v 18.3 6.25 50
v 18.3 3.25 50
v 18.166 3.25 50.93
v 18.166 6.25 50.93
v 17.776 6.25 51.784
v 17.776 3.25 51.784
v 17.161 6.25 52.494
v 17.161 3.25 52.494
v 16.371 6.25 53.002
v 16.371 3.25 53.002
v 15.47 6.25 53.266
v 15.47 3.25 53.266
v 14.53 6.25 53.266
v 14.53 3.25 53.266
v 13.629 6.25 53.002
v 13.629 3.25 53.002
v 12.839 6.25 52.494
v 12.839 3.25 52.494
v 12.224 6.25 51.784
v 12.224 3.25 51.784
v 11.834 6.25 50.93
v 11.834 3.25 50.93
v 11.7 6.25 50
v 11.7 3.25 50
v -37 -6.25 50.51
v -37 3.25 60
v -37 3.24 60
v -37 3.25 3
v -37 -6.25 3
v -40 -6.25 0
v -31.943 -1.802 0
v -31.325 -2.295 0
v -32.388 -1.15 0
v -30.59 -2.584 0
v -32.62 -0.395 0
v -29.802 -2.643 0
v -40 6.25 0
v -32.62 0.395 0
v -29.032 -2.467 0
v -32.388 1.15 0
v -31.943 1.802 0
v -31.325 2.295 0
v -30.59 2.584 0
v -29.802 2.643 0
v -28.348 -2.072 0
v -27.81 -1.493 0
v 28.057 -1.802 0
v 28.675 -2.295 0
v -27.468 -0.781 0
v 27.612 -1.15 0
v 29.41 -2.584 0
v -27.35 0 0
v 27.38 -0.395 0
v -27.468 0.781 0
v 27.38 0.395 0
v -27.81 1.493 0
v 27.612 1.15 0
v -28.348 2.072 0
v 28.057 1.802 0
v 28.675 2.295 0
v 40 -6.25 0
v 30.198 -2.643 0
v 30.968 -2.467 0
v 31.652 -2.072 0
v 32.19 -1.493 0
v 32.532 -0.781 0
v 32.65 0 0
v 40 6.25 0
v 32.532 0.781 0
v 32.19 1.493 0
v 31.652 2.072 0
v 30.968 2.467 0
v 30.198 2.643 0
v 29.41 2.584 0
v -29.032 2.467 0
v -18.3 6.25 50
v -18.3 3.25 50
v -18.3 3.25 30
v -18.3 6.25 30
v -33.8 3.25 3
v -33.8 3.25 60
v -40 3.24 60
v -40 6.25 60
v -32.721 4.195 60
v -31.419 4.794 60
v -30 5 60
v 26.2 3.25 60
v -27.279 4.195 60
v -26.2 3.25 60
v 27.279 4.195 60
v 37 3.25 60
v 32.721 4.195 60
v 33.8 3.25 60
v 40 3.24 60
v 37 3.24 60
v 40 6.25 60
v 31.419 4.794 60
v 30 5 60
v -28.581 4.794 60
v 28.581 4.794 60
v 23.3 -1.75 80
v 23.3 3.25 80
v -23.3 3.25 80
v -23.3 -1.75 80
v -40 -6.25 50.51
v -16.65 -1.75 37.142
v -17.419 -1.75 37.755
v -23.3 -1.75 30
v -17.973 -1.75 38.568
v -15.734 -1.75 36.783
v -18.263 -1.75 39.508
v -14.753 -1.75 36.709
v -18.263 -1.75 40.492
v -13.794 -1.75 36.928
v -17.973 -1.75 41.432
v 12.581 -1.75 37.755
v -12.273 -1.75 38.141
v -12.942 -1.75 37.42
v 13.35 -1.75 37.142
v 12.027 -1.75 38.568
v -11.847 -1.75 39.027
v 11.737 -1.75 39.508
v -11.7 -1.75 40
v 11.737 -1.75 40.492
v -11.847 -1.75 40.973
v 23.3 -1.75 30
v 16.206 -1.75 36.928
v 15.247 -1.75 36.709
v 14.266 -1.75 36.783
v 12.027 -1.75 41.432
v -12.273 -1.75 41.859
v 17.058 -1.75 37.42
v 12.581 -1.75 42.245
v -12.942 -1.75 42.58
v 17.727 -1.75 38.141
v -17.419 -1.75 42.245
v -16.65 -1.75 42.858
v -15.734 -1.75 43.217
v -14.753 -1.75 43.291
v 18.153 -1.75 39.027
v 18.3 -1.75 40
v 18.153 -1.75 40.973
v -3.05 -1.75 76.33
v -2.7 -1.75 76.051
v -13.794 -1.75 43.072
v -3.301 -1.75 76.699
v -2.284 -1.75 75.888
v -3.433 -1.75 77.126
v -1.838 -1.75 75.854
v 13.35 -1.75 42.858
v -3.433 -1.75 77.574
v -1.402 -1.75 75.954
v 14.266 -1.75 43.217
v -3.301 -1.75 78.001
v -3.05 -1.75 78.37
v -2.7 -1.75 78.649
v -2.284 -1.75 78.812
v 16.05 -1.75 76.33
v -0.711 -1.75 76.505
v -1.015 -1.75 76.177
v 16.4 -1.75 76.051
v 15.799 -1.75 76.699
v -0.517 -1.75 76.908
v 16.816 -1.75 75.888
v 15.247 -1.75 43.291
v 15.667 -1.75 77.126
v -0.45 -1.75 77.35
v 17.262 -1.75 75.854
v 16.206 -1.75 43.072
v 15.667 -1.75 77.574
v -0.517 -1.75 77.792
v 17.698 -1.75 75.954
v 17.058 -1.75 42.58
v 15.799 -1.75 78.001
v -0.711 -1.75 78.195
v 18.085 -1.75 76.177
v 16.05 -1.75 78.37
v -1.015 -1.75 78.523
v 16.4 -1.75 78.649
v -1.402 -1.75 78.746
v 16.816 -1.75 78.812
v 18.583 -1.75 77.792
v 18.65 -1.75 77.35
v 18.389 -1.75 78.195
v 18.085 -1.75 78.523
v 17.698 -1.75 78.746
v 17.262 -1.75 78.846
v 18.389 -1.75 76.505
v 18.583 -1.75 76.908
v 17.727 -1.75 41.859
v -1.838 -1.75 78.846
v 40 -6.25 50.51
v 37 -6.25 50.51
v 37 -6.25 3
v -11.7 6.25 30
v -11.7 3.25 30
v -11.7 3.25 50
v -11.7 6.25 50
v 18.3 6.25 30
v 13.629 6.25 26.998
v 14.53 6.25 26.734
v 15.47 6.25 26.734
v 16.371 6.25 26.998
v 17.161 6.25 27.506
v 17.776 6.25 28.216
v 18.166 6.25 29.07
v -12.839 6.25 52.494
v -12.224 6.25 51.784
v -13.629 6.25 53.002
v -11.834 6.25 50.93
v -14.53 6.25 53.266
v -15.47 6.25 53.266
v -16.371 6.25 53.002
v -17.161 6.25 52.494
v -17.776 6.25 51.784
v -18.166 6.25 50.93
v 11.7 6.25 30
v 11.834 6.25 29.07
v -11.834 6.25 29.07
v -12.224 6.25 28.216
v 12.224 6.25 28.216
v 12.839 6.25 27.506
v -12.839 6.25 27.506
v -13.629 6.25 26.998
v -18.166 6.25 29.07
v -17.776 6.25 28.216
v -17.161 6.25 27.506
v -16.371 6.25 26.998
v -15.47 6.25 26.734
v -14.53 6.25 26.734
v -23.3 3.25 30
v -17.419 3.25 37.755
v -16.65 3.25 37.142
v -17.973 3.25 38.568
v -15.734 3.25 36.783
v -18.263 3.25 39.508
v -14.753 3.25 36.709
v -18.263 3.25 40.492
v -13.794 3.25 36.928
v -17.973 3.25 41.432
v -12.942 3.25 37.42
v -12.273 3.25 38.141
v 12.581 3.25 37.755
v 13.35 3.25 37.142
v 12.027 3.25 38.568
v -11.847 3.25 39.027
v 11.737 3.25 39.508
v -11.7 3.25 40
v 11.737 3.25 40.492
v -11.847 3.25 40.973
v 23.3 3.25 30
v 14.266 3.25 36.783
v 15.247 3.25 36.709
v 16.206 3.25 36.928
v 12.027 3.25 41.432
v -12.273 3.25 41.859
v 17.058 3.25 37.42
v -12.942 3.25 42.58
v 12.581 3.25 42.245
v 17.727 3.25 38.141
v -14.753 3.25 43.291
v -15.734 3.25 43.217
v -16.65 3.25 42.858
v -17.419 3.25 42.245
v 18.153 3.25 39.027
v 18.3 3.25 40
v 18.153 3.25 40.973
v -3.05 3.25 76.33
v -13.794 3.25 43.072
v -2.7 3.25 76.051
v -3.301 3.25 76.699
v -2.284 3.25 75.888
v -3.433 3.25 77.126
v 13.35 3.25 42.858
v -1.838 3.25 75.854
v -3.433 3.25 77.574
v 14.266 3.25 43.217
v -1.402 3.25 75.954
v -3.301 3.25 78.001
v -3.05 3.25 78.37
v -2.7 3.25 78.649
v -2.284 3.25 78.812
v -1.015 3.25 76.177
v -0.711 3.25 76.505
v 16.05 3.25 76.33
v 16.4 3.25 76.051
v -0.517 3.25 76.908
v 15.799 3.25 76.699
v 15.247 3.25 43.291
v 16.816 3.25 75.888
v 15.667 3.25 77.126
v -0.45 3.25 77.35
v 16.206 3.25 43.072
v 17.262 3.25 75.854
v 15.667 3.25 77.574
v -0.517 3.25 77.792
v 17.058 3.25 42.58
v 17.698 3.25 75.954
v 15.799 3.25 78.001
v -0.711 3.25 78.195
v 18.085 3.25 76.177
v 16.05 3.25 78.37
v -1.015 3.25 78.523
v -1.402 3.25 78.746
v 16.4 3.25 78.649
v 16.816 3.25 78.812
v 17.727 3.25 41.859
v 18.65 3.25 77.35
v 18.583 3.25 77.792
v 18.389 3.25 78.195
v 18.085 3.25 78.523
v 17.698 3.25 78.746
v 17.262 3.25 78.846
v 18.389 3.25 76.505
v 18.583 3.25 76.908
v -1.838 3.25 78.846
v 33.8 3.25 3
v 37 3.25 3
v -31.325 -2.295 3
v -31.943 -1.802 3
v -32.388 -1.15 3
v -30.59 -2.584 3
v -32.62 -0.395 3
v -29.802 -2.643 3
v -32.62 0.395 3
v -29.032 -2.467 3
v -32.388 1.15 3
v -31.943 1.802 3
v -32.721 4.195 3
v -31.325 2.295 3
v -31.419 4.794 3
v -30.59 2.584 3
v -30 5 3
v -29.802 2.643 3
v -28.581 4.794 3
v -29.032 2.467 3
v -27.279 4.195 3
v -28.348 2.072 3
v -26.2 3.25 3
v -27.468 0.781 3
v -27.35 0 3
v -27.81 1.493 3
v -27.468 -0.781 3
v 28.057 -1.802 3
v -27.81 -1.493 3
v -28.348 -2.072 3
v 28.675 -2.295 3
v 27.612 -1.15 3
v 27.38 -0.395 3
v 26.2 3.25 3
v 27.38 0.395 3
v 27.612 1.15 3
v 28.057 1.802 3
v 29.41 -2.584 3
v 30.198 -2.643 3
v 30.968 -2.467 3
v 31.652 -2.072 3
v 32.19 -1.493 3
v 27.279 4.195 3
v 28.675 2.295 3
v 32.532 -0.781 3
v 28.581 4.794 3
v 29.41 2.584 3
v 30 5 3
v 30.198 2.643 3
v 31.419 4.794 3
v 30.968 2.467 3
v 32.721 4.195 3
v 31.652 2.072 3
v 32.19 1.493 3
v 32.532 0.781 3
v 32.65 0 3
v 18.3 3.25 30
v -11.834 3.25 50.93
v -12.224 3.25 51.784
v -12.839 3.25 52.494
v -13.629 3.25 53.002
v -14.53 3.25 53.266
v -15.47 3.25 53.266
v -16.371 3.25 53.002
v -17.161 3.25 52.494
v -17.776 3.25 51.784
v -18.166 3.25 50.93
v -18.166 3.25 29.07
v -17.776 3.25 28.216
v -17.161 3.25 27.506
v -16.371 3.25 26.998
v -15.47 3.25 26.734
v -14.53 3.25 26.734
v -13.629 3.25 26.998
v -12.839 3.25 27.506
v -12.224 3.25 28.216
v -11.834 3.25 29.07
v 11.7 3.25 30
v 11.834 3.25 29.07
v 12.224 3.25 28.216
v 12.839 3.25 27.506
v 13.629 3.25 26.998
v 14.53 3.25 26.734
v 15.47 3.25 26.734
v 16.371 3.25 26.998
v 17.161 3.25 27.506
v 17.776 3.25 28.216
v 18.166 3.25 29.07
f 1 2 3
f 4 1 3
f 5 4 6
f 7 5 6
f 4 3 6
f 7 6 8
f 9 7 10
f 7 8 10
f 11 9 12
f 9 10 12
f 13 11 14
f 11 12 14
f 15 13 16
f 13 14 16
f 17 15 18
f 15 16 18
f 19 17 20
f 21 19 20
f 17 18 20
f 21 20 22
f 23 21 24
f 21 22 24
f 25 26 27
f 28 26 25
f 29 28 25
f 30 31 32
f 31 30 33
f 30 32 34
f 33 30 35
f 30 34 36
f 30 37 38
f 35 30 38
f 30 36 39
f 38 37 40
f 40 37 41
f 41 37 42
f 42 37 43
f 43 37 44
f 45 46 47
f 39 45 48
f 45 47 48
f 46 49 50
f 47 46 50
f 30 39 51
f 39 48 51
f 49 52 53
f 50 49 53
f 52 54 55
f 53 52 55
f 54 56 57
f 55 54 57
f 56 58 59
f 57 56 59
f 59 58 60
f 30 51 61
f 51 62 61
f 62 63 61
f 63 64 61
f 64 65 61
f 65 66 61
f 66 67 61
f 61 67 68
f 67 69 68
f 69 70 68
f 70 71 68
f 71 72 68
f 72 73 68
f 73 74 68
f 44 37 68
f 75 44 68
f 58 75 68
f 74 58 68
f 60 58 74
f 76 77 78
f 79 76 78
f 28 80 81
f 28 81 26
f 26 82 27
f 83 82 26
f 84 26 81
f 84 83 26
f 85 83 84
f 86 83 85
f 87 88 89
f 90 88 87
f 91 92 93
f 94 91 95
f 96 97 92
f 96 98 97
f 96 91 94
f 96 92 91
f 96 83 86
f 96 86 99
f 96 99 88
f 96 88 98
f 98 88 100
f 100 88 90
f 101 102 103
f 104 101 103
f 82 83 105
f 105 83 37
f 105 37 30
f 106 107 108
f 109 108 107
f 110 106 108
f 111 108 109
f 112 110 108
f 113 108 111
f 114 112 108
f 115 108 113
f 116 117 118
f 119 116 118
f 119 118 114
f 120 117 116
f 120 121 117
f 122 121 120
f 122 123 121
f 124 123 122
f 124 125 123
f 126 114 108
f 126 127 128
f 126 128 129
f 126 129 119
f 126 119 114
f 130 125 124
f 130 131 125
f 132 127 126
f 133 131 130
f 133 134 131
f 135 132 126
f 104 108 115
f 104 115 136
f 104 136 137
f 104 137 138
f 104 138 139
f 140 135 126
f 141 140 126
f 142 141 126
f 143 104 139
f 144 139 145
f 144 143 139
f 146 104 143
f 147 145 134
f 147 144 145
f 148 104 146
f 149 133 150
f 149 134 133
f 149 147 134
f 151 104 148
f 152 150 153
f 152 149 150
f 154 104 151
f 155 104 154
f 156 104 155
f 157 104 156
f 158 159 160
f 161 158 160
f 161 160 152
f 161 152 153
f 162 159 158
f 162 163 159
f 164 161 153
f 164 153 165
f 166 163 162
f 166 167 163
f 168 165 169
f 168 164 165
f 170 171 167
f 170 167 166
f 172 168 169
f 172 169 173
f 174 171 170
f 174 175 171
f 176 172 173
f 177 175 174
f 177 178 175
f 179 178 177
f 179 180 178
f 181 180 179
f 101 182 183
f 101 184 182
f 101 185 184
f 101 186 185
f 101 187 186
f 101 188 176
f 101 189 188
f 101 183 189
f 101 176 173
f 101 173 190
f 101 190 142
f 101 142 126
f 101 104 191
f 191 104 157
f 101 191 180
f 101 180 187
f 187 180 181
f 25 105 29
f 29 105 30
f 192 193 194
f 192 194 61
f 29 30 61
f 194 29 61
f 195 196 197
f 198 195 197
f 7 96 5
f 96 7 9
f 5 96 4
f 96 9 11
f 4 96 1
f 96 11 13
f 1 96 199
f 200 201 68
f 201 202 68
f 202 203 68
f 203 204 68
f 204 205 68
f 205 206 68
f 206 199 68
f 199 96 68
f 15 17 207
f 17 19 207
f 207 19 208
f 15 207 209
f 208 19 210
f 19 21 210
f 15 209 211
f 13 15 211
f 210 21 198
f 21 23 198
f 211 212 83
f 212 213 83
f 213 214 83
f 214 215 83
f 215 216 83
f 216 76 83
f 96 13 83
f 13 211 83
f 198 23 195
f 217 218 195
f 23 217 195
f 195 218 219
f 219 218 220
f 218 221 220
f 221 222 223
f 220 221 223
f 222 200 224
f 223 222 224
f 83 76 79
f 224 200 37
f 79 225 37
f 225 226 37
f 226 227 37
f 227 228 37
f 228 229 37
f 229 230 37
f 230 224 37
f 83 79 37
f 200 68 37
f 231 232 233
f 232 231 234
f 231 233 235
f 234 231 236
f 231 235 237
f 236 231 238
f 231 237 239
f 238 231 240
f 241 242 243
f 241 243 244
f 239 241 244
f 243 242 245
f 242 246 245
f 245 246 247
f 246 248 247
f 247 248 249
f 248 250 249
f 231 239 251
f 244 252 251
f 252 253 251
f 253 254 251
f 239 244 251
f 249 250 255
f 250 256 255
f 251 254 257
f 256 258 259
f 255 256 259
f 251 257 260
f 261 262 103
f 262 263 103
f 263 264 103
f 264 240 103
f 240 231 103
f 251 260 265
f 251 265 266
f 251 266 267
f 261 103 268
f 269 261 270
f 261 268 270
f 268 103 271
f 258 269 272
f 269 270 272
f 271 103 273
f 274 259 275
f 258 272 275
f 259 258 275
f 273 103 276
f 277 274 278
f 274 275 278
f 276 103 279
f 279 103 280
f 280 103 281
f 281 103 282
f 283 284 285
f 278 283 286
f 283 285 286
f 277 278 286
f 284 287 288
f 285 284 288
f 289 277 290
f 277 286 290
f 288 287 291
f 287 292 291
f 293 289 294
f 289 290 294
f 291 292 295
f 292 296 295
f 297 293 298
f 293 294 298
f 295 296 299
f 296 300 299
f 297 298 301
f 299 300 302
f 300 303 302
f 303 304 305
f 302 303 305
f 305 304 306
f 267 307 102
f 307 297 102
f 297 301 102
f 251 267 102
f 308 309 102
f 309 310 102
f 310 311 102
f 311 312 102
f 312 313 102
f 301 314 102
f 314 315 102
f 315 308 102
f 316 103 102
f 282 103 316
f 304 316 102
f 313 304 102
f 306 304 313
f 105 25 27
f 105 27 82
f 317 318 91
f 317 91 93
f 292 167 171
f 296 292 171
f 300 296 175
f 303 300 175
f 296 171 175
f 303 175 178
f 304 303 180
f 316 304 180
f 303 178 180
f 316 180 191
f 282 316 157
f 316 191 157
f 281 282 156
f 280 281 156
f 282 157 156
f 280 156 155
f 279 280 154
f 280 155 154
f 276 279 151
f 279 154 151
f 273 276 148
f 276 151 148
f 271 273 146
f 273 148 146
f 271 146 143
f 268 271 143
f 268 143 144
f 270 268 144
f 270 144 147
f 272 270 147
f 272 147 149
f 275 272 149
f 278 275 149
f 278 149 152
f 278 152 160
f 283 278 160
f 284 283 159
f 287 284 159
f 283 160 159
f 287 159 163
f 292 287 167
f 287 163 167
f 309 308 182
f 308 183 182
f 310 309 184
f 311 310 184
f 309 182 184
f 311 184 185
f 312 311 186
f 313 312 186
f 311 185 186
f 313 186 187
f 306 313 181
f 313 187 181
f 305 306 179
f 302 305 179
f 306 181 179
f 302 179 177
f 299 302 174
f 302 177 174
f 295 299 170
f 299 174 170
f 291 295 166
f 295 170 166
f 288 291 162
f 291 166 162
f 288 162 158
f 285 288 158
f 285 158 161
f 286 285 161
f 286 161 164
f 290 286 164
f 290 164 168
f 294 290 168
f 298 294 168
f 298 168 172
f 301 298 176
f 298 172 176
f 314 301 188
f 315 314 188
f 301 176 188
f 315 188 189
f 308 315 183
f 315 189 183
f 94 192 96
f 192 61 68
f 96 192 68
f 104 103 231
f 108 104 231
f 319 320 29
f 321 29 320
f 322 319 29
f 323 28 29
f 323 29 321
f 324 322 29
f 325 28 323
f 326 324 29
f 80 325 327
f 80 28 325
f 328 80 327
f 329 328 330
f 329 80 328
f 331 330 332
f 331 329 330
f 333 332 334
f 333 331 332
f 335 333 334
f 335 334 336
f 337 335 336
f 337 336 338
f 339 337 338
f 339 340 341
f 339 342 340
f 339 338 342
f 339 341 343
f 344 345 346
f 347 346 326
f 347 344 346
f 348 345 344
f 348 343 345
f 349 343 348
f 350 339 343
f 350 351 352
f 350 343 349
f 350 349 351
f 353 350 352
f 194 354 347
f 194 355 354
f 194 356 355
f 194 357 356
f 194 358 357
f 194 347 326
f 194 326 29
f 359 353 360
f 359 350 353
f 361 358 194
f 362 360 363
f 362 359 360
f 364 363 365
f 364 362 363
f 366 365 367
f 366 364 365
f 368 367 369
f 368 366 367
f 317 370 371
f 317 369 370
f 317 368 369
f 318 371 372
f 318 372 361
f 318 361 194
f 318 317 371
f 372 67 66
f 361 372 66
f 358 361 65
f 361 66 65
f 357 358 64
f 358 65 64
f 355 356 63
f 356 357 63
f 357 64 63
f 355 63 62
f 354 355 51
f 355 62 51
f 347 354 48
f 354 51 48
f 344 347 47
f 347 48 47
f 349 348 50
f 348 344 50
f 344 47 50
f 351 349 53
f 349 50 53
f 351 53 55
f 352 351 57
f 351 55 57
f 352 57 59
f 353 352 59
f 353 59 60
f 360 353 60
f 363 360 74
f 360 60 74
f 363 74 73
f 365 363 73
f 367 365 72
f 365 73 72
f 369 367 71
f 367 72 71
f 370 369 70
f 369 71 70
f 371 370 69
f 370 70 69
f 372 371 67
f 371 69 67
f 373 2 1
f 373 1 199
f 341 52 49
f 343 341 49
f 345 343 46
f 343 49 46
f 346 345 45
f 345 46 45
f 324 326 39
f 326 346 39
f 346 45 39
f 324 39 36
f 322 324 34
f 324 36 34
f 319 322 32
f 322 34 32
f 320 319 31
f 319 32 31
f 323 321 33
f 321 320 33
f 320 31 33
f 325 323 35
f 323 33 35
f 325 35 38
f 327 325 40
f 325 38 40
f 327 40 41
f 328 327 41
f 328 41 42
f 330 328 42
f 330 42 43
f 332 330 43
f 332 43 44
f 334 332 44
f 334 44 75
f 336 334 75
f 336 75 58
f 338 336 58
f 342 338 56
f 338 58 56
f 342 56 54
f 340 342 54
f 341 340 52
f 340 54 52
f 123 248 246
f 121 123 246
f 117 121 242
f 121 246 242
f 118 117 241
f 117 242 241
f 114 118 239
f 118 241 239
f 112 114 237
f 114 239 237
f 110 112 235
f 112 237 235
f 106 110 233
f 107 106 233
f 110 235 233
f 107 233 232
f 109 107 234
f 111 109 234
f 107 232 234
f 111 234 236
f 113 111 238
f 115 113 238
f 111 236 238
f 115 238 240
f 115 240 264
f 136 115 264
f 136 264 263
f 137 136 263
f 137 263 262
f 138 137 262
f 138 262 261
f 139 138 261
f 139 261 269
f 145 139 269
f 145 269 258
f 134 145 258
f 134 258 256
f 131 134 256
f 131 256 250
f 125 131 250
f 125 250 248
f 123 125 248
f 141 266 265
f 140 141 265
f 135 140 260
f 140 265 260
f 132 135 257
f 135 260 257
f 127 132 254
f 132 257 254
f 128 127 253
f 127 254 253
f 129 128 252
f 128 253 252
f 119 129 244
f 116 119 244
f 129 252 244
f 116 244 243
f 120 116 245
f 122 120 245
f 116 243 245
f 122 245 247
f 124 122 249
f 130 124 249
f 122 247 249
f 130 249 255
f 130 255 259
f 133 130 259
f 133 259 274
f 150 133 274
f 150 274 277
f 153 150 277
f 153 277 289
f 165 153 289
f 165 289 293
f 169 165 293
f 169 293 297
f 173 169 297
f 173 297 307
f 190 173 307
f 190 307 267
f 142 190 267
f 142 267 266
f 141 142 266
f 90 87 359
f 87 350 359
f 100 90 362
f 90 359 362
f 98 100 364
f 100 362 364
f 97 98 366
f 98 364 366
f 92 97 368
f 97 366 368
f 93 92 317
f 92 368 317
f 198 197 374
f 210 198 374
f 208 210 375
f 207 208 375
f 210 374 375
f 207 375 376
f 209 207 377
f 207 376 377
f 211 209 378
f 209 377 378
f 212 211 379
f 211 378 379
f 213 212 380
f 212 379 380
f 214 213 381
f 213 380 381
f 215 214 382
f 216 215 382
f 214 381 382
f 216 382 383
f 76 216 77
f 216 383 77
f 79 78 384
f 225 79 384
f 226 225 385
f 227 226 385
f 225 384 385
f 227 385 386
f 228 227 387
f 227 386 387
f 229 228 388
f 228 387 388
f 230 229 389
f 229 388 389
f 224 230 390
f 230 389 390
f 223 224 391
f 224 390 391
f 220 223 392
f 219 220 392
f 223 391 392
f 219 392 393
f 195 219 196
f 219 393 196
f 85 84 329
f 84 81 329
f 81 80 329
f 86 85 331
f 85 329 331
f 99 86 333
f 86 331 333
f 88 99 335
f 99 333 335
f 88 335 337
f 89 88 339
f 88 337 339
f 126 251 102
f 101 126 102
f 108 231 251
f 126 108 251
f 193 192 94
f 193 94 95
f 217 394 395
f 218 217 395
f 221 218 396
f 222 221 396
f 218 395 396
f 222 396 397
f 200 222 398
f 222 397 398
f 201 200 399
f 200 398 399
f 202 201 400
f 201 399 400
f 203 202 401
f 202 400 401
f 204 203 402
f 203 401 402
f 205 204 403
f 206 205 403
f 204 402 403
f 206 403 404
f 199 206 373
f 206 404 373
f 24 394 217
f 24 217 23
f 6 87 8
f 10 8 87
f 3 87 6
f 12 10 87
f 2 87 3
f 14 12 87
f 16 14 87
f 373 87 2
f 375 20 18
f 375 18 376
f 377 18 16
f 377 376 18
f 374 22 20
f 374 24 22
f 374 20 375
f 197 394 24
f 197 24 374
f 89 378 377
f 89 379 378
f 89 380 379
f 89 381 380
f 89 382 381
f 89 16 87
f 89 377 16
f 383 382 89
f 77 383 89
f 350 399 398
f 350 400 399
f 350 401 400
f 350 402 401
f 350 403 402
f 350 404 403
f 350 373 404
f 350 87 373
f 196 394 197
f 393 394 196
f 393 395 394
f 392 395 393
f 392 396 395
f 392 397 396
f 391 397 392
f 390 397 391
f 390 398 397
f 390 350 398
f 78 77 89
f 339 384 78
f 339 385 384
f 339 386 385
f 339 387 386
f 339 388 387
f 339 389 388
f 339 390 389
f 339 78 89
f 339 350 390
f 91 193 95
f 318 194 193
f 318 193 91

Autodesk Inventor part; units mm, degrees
ref_plane "YZ Plane" through (0, 0, 0) normal (1, 0, 0) x (0, 1, 0)
ref_plane "XZ Plane" through (0, 0, 0) normal (0, 1, 0) x (-1, 0, 0)
ref_plane "XY Plane" through (0, 0, 0) normal (0, 0, 1) x (1, 0, 0)
sketch "Sketch1" plane through (0, 0, 0) normal (0, 0, 1) x (1, 0, 0)
  line L0 (-40, -6.25) -> (40, -6.25)
  line L1 (40, -6.25) -> (40, 6.25)
  line L2 (40, 6.25) -> (-40, 6.25)
  line L3 (-40, 6.25) -> (-40, -6.25)
  line L4 (-40, -6.25) -> (40, 6.25) construction
  line L5 (40, -6.25) -> (-40, 6.25) construction
  line L6 (-30, 0) -> (30, 0) construction
  circle A0 centre (-30, 0) radius 2.65
  circle A1 centre (30, 0) radius 2.65
  circle A2 centre (-30, 0) radius 5
  circle A3 centre (30, 0) radius 5
  line L7 (-40, 6.25) -> (-37, 6.25)
  line L8 (-37, 6.25) -> (-37, -6.25)
  line L9 (-37, -6.25) -> (-40, -6.25)
  line L10 (-40, -6.25) -> (-40, 6.25)
  line L11 (40, -6.25) -> (37, -6.25)
  line L12 (37, -6.25) -> (37, 6.25)
  line L13 (37, 6.25) -> (40, 6.25)
  line L14 (40, 6.25) -> (40, -6.25)
  line L15 (-40, 6.25) -> (40, 6.25)
  line L16 (40, 6.25) -> (40, 3.25)
  line L17 (40, 3.25) -> (-40, 3.25)
  line L18 (-40, 3.25) -> (-40, 6.25)
  point P0 (0, 0)
  point P1 (-37, 3.25)
  point P2 (-33.7997, 3.25)
  point P3 (-26.2003, 3.25)
  point P4 (26.2003, 3.25)
  point P5 (33.7997, 3.25)
  point P6 (37, 3.25)
  dimension "d0" = 80
  dimension "d1" = 12.5
  dimension "d2" = 60
  dimension "d3" = 5.3
  dimension "d4" = 5.3
  dimension "d5" = 10
  dimension "d6" = 10
  dimension "d9" = 3
  dimension "d10" = 3
  dimension "d11" = 3
extrude "Extrusion1" add sketch "Sketch1" along normal blind 3
extrude "Extrusion2" add sketch "Sketch1" along normal blind 60 contours L3 L17 L8 L0 | L3 L2 L8 L17 | L12 L17 L1 L0 | L8 L2 L12 L17 A3 A2 | L12 L2 L1 L17
chamfer "Chamfer1" distance 9.49 angle 45 2 edges at (-38.5, -6.25, 60) (38.5, -6.25, 60)
sketch "Sketch2" plane through (-26.2003, 3.25, 3) normal (0, -1, 0) x (1, 0, 0)
  line L0 (11.2003, 27) -> (11.2003, 47) construction
  line L1 (14.5003, 27) -> (14.5003, 47)
  line L2 (7.9003, 47) -> (7.9003, 27)
  arc A0 (7.9003, 27) -> (14.5003, 27) centre (11.2003, 27) ccw
  arc A1 (14.5003, 47) -> (7.9003, 47) centre (11.2003, 47) ccw
  line L3 (41.2003, 27) -> (41.2003, 47) construction
  line L4 (37.9003, 27) -> (37.9003, 47)
  line L5 (44.5003, 47) -> (44.5003, 27)
  arc A2 (37.9003, 27) -> (44.5003, 27) centre (41.2003, 27) ccw
  arc A3 (44.5003, 47) -> (37.9003, 47) centre (41.2003, 47) ccw
  line L6 (11.2003, 37) -> (41.2003, 37) construction
  line L7 (26.2003, 37) -> (26.2003, 57) construction
  line L8 (0, 57) -> (52.4007, 57) projected
  line L9 (2.9003, 27) -> (49.5003, 27)
  line L10 (49.5003, 27) -> (49.5003, 77)
  line L11 (49.5003, 77) -> (2.9003, 77)
  line L12 (2.9003, 77) -> (2.9003, 27)
  line L13 (26.2003, 27) -> (26.2003, 37) construction
  circle A4 centre (11.2003, 37) radius 3.3
  circle A5 centre (41.2003, 37) radius 3.3
  point P0 (26.2003, -3)
  dimension "d17" = 30
  dimension "d18" = 20
  dimension "d19" = 20
  dimension "d20" = 3.3
  dimension "d21" = 5
  dimension "d29" = 20
  dimension "d30" = 10
extrude "Extrusion3" cut sketch "Sketch2" against normal through all contours L9 L2 A4 L1 | A0 L9 | A4 L2 A1 L1 | A4 | L9 A2 | L4 A5 L5 L9 | L4 A3 L5 A5 | A5
extrude "Extrusion4" add sketch "Sketch2" along normal blind 5 separate body contours L9 L2 A4 L1 | L1 A1 L2 L9 L12 L8 L10 L5 A3 L4 | A4 L2 A1 L1 | L4 A5 L5 L9 | L4 A3 L5 A5 | L12 L11 L10 L8
sketch "Sketch3" plane through (-26.2003, -1.75, 3) normal (0, -1, 0) x (1, 0, 0)
  line L0 (5.9503, 60.9) -> (5.9503, 77)
  line L1 (5.9503, 77) -> (46.4503, 77)
  line L2 (46.4503, 77) -> (46.4503, 60.9)
  line L3 (46.4503, 60.9) -> (5.9503, 60.9)
  line L4 (24.2503, 74.35) -> (43.3503, 74.35) construction
  circle A0 centre (24.2503, 74.35) radius 1.5
  circle A1 centre (43.3503, 74.35) radius 1.5
  line L5 (49.5003, 77) -> (2.9003, 77) projected
  line L6 (26.2003, 77) -> (26.2003, 77)
  point P0 (26.2003, -3)
  dimension "d31" = 3
  dimension "d32" = 19.1
  dimension "d34" = 2.65
  dimension "d35" = 16.1
  dimension "d36" = 40.5
  dimension "d37" = 0
  dimension "d40" = 3.1
extrude "Extrusion5" cut sketch "Sketch3" against normal through all contours A0 | A1 bodies 2
properties part number "Soporte Switch Y"
